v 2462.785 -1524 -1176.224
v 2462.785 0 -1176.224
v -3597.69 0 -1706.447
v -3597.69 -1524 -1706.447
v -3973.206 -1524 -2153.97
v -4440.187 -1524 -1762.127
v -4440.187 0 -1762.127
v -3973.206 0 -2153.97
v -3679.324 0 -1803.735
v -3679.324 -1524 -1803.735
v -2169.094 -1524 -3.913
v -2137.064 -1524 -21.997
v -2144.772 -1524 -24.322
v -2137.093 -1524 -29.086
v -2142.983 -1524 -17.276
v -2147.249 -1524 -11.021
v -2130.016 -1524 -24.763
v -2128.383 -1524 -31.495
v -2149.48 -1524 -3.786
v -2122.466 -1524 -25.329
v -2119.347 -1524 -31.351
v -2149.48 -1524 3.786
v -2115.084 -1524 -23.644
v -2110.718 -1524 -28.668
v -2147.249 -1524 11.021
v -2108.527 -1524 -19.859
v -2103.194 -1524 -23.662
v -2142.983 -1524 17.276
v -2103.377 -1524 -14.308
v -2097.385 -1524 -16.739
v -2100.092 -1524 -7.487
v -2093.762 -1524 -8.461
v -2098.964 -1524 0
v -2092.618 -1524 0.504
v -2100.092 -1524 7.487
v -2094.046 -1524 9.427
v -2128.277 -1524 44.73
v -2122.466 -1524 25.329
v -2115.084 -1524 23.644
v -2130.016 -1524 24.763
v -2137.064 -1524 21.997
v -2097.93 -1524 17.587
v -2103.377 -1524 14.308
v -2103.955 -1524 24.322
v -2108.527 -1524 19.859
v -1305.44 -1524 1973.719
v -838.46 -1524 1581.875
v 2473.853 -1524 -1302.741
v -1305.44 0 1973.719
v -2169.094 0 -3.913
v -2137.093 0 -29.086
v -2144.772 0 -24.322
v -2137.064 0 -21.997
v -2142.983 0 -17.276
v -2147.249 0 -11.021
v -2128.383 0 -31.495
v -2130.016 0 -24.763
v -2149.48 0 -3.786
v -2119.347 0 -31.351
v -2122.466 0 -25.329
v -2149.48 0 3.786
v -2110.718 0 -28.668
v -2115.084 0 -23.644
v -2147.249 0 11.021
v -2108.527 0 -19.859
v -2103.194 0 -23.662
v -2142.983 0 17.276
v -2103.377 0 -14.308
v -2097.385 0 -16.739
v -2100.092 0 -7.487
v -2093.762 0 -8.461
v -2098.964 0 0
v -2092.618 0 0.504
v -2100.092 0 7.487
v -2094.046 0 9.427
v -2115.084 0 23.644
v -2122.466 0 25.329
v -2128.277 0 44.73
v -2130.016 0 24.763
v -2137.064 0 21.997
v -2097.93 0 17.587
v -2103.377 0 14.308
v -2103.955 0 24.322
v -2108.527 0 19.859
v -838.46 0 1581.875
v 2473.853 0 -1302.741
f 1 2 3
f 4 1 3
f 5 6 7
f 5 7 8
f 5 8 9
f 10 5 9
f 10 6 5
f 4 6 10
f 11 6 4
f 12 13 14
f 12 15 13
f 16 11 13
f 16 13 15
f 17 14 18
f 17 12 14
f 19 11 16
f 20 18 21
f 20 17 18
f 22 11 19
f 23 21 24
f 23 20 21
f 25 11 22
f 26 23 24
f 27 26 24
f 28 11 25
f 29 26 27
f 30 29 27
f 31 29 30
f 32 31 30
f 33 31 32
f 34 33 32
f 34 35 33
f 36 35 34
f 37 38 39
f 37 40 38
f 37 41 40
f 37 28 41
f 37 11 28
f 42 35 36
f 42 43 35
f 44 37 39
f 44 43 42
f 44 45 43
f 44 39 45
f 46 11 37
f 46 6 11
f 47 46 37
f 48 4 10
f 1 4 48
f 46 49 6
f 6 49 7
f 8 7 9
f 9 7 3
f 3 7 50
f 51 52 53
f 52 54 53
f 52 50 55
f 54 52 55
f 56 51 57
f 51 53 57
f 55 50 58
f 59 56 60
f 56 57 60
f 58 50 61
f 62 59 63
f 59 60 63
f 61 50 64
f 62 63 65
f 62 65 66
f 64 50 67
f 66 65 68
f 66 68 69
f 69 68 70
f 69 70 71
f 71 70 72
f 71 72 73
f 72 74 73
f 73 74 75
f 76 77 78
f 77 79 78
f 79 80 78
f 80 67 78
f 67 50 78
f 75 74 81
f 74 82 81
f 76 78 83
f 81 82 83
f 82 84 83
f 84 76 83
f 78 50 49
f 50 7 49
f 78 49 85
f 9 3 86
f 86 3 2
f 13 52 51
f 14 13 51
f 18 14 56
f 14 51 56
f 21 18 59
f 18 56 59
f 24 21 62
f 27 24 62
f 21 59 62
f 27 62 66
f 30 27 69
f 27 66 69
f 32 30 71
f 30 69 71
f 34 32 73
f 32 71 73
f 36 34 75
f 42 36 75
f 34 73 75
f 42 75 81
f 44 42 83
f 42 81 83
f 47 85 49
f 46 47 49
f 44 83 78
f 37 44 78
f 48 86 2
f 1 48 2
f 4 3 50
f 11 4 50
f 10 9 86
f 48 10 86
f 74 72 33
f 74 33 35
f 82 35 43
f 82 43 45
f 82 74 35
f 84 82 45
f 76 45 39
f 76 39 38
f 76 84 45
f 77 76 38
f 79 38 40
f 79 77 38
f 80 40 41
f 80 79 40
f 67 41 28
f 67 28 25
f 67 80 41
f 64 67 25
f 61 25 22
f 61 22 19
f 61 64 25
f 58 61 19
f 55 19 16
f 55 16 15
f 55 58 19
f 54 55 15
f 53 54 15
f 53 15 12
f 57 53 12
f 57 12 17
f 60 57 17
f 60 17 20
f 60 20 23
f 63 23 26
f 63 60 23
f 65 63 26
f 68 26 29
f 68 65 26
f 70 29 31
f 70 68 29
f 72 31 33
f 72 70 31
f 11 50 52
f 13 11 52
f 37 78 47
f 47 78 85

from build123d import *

# Parameters (mm, degrees)
F0_R     = 25.4
F1_DEPTH = 1524


# Not quite as in the source:
# - a feature names something its author has since deleted; it is built from what else it names


with BuildPart() as f1:
    # F0 (on Front) → F1 (new body)
    with BuildSketch(Plane.XZ):
        with BuildLine():
            Line((-2128.2773420369, 44.7304176766), (-838.4597244399, 1581.8751972391))
            Line((-838.4597244399, 1581.8751972391), (-1305.4404169652, 1973.718524104))
            Line((-1305.4404169652, 1973.718524104), (-4440.1870318845, -1762.1270160986))
            Line((-4440.1870318845, -1762.1270160986), (-3973.2063393592, -2153.9703429635))
            Line((-3973.2063393592, -2153.9703429635), (-3679.3238442105, -1803.7348235695))
            Line((-3679.3238442105, -1803.7348235695), (2473.8534732187, -1302.7410905921))
            Line((2473.8534732187, -1302.7410905921), (2462.7846938898, -1176.2243639345))
            Line((2462.7846938898, -1176.2243639345), (-3597.6898177803, -1706.4471792934))
            Line((-3597.6898177803, -1706.4471792934), (-2169.094355252, -3.9134044615))
            Line((-2169.094355252, -3.9134044615), (-2144.772444183, -24.321911069))
            ThreePointArc((-2144.772444183, -24.321911069), (-2100.0420265064, -20.4085066075), (-2103.9554309679, 24.321911069))
            Line((-2103.9554309679, 24.321911069), (-2128.2773420369, 44.7304176766))
        make_face()
        with Locations((-2124.3639375754, 0)):
            Circle(F0_R, mode=Mode.SUBTRACT)
    extrude(amount=F1_DEPTH)


solid = f1.part
